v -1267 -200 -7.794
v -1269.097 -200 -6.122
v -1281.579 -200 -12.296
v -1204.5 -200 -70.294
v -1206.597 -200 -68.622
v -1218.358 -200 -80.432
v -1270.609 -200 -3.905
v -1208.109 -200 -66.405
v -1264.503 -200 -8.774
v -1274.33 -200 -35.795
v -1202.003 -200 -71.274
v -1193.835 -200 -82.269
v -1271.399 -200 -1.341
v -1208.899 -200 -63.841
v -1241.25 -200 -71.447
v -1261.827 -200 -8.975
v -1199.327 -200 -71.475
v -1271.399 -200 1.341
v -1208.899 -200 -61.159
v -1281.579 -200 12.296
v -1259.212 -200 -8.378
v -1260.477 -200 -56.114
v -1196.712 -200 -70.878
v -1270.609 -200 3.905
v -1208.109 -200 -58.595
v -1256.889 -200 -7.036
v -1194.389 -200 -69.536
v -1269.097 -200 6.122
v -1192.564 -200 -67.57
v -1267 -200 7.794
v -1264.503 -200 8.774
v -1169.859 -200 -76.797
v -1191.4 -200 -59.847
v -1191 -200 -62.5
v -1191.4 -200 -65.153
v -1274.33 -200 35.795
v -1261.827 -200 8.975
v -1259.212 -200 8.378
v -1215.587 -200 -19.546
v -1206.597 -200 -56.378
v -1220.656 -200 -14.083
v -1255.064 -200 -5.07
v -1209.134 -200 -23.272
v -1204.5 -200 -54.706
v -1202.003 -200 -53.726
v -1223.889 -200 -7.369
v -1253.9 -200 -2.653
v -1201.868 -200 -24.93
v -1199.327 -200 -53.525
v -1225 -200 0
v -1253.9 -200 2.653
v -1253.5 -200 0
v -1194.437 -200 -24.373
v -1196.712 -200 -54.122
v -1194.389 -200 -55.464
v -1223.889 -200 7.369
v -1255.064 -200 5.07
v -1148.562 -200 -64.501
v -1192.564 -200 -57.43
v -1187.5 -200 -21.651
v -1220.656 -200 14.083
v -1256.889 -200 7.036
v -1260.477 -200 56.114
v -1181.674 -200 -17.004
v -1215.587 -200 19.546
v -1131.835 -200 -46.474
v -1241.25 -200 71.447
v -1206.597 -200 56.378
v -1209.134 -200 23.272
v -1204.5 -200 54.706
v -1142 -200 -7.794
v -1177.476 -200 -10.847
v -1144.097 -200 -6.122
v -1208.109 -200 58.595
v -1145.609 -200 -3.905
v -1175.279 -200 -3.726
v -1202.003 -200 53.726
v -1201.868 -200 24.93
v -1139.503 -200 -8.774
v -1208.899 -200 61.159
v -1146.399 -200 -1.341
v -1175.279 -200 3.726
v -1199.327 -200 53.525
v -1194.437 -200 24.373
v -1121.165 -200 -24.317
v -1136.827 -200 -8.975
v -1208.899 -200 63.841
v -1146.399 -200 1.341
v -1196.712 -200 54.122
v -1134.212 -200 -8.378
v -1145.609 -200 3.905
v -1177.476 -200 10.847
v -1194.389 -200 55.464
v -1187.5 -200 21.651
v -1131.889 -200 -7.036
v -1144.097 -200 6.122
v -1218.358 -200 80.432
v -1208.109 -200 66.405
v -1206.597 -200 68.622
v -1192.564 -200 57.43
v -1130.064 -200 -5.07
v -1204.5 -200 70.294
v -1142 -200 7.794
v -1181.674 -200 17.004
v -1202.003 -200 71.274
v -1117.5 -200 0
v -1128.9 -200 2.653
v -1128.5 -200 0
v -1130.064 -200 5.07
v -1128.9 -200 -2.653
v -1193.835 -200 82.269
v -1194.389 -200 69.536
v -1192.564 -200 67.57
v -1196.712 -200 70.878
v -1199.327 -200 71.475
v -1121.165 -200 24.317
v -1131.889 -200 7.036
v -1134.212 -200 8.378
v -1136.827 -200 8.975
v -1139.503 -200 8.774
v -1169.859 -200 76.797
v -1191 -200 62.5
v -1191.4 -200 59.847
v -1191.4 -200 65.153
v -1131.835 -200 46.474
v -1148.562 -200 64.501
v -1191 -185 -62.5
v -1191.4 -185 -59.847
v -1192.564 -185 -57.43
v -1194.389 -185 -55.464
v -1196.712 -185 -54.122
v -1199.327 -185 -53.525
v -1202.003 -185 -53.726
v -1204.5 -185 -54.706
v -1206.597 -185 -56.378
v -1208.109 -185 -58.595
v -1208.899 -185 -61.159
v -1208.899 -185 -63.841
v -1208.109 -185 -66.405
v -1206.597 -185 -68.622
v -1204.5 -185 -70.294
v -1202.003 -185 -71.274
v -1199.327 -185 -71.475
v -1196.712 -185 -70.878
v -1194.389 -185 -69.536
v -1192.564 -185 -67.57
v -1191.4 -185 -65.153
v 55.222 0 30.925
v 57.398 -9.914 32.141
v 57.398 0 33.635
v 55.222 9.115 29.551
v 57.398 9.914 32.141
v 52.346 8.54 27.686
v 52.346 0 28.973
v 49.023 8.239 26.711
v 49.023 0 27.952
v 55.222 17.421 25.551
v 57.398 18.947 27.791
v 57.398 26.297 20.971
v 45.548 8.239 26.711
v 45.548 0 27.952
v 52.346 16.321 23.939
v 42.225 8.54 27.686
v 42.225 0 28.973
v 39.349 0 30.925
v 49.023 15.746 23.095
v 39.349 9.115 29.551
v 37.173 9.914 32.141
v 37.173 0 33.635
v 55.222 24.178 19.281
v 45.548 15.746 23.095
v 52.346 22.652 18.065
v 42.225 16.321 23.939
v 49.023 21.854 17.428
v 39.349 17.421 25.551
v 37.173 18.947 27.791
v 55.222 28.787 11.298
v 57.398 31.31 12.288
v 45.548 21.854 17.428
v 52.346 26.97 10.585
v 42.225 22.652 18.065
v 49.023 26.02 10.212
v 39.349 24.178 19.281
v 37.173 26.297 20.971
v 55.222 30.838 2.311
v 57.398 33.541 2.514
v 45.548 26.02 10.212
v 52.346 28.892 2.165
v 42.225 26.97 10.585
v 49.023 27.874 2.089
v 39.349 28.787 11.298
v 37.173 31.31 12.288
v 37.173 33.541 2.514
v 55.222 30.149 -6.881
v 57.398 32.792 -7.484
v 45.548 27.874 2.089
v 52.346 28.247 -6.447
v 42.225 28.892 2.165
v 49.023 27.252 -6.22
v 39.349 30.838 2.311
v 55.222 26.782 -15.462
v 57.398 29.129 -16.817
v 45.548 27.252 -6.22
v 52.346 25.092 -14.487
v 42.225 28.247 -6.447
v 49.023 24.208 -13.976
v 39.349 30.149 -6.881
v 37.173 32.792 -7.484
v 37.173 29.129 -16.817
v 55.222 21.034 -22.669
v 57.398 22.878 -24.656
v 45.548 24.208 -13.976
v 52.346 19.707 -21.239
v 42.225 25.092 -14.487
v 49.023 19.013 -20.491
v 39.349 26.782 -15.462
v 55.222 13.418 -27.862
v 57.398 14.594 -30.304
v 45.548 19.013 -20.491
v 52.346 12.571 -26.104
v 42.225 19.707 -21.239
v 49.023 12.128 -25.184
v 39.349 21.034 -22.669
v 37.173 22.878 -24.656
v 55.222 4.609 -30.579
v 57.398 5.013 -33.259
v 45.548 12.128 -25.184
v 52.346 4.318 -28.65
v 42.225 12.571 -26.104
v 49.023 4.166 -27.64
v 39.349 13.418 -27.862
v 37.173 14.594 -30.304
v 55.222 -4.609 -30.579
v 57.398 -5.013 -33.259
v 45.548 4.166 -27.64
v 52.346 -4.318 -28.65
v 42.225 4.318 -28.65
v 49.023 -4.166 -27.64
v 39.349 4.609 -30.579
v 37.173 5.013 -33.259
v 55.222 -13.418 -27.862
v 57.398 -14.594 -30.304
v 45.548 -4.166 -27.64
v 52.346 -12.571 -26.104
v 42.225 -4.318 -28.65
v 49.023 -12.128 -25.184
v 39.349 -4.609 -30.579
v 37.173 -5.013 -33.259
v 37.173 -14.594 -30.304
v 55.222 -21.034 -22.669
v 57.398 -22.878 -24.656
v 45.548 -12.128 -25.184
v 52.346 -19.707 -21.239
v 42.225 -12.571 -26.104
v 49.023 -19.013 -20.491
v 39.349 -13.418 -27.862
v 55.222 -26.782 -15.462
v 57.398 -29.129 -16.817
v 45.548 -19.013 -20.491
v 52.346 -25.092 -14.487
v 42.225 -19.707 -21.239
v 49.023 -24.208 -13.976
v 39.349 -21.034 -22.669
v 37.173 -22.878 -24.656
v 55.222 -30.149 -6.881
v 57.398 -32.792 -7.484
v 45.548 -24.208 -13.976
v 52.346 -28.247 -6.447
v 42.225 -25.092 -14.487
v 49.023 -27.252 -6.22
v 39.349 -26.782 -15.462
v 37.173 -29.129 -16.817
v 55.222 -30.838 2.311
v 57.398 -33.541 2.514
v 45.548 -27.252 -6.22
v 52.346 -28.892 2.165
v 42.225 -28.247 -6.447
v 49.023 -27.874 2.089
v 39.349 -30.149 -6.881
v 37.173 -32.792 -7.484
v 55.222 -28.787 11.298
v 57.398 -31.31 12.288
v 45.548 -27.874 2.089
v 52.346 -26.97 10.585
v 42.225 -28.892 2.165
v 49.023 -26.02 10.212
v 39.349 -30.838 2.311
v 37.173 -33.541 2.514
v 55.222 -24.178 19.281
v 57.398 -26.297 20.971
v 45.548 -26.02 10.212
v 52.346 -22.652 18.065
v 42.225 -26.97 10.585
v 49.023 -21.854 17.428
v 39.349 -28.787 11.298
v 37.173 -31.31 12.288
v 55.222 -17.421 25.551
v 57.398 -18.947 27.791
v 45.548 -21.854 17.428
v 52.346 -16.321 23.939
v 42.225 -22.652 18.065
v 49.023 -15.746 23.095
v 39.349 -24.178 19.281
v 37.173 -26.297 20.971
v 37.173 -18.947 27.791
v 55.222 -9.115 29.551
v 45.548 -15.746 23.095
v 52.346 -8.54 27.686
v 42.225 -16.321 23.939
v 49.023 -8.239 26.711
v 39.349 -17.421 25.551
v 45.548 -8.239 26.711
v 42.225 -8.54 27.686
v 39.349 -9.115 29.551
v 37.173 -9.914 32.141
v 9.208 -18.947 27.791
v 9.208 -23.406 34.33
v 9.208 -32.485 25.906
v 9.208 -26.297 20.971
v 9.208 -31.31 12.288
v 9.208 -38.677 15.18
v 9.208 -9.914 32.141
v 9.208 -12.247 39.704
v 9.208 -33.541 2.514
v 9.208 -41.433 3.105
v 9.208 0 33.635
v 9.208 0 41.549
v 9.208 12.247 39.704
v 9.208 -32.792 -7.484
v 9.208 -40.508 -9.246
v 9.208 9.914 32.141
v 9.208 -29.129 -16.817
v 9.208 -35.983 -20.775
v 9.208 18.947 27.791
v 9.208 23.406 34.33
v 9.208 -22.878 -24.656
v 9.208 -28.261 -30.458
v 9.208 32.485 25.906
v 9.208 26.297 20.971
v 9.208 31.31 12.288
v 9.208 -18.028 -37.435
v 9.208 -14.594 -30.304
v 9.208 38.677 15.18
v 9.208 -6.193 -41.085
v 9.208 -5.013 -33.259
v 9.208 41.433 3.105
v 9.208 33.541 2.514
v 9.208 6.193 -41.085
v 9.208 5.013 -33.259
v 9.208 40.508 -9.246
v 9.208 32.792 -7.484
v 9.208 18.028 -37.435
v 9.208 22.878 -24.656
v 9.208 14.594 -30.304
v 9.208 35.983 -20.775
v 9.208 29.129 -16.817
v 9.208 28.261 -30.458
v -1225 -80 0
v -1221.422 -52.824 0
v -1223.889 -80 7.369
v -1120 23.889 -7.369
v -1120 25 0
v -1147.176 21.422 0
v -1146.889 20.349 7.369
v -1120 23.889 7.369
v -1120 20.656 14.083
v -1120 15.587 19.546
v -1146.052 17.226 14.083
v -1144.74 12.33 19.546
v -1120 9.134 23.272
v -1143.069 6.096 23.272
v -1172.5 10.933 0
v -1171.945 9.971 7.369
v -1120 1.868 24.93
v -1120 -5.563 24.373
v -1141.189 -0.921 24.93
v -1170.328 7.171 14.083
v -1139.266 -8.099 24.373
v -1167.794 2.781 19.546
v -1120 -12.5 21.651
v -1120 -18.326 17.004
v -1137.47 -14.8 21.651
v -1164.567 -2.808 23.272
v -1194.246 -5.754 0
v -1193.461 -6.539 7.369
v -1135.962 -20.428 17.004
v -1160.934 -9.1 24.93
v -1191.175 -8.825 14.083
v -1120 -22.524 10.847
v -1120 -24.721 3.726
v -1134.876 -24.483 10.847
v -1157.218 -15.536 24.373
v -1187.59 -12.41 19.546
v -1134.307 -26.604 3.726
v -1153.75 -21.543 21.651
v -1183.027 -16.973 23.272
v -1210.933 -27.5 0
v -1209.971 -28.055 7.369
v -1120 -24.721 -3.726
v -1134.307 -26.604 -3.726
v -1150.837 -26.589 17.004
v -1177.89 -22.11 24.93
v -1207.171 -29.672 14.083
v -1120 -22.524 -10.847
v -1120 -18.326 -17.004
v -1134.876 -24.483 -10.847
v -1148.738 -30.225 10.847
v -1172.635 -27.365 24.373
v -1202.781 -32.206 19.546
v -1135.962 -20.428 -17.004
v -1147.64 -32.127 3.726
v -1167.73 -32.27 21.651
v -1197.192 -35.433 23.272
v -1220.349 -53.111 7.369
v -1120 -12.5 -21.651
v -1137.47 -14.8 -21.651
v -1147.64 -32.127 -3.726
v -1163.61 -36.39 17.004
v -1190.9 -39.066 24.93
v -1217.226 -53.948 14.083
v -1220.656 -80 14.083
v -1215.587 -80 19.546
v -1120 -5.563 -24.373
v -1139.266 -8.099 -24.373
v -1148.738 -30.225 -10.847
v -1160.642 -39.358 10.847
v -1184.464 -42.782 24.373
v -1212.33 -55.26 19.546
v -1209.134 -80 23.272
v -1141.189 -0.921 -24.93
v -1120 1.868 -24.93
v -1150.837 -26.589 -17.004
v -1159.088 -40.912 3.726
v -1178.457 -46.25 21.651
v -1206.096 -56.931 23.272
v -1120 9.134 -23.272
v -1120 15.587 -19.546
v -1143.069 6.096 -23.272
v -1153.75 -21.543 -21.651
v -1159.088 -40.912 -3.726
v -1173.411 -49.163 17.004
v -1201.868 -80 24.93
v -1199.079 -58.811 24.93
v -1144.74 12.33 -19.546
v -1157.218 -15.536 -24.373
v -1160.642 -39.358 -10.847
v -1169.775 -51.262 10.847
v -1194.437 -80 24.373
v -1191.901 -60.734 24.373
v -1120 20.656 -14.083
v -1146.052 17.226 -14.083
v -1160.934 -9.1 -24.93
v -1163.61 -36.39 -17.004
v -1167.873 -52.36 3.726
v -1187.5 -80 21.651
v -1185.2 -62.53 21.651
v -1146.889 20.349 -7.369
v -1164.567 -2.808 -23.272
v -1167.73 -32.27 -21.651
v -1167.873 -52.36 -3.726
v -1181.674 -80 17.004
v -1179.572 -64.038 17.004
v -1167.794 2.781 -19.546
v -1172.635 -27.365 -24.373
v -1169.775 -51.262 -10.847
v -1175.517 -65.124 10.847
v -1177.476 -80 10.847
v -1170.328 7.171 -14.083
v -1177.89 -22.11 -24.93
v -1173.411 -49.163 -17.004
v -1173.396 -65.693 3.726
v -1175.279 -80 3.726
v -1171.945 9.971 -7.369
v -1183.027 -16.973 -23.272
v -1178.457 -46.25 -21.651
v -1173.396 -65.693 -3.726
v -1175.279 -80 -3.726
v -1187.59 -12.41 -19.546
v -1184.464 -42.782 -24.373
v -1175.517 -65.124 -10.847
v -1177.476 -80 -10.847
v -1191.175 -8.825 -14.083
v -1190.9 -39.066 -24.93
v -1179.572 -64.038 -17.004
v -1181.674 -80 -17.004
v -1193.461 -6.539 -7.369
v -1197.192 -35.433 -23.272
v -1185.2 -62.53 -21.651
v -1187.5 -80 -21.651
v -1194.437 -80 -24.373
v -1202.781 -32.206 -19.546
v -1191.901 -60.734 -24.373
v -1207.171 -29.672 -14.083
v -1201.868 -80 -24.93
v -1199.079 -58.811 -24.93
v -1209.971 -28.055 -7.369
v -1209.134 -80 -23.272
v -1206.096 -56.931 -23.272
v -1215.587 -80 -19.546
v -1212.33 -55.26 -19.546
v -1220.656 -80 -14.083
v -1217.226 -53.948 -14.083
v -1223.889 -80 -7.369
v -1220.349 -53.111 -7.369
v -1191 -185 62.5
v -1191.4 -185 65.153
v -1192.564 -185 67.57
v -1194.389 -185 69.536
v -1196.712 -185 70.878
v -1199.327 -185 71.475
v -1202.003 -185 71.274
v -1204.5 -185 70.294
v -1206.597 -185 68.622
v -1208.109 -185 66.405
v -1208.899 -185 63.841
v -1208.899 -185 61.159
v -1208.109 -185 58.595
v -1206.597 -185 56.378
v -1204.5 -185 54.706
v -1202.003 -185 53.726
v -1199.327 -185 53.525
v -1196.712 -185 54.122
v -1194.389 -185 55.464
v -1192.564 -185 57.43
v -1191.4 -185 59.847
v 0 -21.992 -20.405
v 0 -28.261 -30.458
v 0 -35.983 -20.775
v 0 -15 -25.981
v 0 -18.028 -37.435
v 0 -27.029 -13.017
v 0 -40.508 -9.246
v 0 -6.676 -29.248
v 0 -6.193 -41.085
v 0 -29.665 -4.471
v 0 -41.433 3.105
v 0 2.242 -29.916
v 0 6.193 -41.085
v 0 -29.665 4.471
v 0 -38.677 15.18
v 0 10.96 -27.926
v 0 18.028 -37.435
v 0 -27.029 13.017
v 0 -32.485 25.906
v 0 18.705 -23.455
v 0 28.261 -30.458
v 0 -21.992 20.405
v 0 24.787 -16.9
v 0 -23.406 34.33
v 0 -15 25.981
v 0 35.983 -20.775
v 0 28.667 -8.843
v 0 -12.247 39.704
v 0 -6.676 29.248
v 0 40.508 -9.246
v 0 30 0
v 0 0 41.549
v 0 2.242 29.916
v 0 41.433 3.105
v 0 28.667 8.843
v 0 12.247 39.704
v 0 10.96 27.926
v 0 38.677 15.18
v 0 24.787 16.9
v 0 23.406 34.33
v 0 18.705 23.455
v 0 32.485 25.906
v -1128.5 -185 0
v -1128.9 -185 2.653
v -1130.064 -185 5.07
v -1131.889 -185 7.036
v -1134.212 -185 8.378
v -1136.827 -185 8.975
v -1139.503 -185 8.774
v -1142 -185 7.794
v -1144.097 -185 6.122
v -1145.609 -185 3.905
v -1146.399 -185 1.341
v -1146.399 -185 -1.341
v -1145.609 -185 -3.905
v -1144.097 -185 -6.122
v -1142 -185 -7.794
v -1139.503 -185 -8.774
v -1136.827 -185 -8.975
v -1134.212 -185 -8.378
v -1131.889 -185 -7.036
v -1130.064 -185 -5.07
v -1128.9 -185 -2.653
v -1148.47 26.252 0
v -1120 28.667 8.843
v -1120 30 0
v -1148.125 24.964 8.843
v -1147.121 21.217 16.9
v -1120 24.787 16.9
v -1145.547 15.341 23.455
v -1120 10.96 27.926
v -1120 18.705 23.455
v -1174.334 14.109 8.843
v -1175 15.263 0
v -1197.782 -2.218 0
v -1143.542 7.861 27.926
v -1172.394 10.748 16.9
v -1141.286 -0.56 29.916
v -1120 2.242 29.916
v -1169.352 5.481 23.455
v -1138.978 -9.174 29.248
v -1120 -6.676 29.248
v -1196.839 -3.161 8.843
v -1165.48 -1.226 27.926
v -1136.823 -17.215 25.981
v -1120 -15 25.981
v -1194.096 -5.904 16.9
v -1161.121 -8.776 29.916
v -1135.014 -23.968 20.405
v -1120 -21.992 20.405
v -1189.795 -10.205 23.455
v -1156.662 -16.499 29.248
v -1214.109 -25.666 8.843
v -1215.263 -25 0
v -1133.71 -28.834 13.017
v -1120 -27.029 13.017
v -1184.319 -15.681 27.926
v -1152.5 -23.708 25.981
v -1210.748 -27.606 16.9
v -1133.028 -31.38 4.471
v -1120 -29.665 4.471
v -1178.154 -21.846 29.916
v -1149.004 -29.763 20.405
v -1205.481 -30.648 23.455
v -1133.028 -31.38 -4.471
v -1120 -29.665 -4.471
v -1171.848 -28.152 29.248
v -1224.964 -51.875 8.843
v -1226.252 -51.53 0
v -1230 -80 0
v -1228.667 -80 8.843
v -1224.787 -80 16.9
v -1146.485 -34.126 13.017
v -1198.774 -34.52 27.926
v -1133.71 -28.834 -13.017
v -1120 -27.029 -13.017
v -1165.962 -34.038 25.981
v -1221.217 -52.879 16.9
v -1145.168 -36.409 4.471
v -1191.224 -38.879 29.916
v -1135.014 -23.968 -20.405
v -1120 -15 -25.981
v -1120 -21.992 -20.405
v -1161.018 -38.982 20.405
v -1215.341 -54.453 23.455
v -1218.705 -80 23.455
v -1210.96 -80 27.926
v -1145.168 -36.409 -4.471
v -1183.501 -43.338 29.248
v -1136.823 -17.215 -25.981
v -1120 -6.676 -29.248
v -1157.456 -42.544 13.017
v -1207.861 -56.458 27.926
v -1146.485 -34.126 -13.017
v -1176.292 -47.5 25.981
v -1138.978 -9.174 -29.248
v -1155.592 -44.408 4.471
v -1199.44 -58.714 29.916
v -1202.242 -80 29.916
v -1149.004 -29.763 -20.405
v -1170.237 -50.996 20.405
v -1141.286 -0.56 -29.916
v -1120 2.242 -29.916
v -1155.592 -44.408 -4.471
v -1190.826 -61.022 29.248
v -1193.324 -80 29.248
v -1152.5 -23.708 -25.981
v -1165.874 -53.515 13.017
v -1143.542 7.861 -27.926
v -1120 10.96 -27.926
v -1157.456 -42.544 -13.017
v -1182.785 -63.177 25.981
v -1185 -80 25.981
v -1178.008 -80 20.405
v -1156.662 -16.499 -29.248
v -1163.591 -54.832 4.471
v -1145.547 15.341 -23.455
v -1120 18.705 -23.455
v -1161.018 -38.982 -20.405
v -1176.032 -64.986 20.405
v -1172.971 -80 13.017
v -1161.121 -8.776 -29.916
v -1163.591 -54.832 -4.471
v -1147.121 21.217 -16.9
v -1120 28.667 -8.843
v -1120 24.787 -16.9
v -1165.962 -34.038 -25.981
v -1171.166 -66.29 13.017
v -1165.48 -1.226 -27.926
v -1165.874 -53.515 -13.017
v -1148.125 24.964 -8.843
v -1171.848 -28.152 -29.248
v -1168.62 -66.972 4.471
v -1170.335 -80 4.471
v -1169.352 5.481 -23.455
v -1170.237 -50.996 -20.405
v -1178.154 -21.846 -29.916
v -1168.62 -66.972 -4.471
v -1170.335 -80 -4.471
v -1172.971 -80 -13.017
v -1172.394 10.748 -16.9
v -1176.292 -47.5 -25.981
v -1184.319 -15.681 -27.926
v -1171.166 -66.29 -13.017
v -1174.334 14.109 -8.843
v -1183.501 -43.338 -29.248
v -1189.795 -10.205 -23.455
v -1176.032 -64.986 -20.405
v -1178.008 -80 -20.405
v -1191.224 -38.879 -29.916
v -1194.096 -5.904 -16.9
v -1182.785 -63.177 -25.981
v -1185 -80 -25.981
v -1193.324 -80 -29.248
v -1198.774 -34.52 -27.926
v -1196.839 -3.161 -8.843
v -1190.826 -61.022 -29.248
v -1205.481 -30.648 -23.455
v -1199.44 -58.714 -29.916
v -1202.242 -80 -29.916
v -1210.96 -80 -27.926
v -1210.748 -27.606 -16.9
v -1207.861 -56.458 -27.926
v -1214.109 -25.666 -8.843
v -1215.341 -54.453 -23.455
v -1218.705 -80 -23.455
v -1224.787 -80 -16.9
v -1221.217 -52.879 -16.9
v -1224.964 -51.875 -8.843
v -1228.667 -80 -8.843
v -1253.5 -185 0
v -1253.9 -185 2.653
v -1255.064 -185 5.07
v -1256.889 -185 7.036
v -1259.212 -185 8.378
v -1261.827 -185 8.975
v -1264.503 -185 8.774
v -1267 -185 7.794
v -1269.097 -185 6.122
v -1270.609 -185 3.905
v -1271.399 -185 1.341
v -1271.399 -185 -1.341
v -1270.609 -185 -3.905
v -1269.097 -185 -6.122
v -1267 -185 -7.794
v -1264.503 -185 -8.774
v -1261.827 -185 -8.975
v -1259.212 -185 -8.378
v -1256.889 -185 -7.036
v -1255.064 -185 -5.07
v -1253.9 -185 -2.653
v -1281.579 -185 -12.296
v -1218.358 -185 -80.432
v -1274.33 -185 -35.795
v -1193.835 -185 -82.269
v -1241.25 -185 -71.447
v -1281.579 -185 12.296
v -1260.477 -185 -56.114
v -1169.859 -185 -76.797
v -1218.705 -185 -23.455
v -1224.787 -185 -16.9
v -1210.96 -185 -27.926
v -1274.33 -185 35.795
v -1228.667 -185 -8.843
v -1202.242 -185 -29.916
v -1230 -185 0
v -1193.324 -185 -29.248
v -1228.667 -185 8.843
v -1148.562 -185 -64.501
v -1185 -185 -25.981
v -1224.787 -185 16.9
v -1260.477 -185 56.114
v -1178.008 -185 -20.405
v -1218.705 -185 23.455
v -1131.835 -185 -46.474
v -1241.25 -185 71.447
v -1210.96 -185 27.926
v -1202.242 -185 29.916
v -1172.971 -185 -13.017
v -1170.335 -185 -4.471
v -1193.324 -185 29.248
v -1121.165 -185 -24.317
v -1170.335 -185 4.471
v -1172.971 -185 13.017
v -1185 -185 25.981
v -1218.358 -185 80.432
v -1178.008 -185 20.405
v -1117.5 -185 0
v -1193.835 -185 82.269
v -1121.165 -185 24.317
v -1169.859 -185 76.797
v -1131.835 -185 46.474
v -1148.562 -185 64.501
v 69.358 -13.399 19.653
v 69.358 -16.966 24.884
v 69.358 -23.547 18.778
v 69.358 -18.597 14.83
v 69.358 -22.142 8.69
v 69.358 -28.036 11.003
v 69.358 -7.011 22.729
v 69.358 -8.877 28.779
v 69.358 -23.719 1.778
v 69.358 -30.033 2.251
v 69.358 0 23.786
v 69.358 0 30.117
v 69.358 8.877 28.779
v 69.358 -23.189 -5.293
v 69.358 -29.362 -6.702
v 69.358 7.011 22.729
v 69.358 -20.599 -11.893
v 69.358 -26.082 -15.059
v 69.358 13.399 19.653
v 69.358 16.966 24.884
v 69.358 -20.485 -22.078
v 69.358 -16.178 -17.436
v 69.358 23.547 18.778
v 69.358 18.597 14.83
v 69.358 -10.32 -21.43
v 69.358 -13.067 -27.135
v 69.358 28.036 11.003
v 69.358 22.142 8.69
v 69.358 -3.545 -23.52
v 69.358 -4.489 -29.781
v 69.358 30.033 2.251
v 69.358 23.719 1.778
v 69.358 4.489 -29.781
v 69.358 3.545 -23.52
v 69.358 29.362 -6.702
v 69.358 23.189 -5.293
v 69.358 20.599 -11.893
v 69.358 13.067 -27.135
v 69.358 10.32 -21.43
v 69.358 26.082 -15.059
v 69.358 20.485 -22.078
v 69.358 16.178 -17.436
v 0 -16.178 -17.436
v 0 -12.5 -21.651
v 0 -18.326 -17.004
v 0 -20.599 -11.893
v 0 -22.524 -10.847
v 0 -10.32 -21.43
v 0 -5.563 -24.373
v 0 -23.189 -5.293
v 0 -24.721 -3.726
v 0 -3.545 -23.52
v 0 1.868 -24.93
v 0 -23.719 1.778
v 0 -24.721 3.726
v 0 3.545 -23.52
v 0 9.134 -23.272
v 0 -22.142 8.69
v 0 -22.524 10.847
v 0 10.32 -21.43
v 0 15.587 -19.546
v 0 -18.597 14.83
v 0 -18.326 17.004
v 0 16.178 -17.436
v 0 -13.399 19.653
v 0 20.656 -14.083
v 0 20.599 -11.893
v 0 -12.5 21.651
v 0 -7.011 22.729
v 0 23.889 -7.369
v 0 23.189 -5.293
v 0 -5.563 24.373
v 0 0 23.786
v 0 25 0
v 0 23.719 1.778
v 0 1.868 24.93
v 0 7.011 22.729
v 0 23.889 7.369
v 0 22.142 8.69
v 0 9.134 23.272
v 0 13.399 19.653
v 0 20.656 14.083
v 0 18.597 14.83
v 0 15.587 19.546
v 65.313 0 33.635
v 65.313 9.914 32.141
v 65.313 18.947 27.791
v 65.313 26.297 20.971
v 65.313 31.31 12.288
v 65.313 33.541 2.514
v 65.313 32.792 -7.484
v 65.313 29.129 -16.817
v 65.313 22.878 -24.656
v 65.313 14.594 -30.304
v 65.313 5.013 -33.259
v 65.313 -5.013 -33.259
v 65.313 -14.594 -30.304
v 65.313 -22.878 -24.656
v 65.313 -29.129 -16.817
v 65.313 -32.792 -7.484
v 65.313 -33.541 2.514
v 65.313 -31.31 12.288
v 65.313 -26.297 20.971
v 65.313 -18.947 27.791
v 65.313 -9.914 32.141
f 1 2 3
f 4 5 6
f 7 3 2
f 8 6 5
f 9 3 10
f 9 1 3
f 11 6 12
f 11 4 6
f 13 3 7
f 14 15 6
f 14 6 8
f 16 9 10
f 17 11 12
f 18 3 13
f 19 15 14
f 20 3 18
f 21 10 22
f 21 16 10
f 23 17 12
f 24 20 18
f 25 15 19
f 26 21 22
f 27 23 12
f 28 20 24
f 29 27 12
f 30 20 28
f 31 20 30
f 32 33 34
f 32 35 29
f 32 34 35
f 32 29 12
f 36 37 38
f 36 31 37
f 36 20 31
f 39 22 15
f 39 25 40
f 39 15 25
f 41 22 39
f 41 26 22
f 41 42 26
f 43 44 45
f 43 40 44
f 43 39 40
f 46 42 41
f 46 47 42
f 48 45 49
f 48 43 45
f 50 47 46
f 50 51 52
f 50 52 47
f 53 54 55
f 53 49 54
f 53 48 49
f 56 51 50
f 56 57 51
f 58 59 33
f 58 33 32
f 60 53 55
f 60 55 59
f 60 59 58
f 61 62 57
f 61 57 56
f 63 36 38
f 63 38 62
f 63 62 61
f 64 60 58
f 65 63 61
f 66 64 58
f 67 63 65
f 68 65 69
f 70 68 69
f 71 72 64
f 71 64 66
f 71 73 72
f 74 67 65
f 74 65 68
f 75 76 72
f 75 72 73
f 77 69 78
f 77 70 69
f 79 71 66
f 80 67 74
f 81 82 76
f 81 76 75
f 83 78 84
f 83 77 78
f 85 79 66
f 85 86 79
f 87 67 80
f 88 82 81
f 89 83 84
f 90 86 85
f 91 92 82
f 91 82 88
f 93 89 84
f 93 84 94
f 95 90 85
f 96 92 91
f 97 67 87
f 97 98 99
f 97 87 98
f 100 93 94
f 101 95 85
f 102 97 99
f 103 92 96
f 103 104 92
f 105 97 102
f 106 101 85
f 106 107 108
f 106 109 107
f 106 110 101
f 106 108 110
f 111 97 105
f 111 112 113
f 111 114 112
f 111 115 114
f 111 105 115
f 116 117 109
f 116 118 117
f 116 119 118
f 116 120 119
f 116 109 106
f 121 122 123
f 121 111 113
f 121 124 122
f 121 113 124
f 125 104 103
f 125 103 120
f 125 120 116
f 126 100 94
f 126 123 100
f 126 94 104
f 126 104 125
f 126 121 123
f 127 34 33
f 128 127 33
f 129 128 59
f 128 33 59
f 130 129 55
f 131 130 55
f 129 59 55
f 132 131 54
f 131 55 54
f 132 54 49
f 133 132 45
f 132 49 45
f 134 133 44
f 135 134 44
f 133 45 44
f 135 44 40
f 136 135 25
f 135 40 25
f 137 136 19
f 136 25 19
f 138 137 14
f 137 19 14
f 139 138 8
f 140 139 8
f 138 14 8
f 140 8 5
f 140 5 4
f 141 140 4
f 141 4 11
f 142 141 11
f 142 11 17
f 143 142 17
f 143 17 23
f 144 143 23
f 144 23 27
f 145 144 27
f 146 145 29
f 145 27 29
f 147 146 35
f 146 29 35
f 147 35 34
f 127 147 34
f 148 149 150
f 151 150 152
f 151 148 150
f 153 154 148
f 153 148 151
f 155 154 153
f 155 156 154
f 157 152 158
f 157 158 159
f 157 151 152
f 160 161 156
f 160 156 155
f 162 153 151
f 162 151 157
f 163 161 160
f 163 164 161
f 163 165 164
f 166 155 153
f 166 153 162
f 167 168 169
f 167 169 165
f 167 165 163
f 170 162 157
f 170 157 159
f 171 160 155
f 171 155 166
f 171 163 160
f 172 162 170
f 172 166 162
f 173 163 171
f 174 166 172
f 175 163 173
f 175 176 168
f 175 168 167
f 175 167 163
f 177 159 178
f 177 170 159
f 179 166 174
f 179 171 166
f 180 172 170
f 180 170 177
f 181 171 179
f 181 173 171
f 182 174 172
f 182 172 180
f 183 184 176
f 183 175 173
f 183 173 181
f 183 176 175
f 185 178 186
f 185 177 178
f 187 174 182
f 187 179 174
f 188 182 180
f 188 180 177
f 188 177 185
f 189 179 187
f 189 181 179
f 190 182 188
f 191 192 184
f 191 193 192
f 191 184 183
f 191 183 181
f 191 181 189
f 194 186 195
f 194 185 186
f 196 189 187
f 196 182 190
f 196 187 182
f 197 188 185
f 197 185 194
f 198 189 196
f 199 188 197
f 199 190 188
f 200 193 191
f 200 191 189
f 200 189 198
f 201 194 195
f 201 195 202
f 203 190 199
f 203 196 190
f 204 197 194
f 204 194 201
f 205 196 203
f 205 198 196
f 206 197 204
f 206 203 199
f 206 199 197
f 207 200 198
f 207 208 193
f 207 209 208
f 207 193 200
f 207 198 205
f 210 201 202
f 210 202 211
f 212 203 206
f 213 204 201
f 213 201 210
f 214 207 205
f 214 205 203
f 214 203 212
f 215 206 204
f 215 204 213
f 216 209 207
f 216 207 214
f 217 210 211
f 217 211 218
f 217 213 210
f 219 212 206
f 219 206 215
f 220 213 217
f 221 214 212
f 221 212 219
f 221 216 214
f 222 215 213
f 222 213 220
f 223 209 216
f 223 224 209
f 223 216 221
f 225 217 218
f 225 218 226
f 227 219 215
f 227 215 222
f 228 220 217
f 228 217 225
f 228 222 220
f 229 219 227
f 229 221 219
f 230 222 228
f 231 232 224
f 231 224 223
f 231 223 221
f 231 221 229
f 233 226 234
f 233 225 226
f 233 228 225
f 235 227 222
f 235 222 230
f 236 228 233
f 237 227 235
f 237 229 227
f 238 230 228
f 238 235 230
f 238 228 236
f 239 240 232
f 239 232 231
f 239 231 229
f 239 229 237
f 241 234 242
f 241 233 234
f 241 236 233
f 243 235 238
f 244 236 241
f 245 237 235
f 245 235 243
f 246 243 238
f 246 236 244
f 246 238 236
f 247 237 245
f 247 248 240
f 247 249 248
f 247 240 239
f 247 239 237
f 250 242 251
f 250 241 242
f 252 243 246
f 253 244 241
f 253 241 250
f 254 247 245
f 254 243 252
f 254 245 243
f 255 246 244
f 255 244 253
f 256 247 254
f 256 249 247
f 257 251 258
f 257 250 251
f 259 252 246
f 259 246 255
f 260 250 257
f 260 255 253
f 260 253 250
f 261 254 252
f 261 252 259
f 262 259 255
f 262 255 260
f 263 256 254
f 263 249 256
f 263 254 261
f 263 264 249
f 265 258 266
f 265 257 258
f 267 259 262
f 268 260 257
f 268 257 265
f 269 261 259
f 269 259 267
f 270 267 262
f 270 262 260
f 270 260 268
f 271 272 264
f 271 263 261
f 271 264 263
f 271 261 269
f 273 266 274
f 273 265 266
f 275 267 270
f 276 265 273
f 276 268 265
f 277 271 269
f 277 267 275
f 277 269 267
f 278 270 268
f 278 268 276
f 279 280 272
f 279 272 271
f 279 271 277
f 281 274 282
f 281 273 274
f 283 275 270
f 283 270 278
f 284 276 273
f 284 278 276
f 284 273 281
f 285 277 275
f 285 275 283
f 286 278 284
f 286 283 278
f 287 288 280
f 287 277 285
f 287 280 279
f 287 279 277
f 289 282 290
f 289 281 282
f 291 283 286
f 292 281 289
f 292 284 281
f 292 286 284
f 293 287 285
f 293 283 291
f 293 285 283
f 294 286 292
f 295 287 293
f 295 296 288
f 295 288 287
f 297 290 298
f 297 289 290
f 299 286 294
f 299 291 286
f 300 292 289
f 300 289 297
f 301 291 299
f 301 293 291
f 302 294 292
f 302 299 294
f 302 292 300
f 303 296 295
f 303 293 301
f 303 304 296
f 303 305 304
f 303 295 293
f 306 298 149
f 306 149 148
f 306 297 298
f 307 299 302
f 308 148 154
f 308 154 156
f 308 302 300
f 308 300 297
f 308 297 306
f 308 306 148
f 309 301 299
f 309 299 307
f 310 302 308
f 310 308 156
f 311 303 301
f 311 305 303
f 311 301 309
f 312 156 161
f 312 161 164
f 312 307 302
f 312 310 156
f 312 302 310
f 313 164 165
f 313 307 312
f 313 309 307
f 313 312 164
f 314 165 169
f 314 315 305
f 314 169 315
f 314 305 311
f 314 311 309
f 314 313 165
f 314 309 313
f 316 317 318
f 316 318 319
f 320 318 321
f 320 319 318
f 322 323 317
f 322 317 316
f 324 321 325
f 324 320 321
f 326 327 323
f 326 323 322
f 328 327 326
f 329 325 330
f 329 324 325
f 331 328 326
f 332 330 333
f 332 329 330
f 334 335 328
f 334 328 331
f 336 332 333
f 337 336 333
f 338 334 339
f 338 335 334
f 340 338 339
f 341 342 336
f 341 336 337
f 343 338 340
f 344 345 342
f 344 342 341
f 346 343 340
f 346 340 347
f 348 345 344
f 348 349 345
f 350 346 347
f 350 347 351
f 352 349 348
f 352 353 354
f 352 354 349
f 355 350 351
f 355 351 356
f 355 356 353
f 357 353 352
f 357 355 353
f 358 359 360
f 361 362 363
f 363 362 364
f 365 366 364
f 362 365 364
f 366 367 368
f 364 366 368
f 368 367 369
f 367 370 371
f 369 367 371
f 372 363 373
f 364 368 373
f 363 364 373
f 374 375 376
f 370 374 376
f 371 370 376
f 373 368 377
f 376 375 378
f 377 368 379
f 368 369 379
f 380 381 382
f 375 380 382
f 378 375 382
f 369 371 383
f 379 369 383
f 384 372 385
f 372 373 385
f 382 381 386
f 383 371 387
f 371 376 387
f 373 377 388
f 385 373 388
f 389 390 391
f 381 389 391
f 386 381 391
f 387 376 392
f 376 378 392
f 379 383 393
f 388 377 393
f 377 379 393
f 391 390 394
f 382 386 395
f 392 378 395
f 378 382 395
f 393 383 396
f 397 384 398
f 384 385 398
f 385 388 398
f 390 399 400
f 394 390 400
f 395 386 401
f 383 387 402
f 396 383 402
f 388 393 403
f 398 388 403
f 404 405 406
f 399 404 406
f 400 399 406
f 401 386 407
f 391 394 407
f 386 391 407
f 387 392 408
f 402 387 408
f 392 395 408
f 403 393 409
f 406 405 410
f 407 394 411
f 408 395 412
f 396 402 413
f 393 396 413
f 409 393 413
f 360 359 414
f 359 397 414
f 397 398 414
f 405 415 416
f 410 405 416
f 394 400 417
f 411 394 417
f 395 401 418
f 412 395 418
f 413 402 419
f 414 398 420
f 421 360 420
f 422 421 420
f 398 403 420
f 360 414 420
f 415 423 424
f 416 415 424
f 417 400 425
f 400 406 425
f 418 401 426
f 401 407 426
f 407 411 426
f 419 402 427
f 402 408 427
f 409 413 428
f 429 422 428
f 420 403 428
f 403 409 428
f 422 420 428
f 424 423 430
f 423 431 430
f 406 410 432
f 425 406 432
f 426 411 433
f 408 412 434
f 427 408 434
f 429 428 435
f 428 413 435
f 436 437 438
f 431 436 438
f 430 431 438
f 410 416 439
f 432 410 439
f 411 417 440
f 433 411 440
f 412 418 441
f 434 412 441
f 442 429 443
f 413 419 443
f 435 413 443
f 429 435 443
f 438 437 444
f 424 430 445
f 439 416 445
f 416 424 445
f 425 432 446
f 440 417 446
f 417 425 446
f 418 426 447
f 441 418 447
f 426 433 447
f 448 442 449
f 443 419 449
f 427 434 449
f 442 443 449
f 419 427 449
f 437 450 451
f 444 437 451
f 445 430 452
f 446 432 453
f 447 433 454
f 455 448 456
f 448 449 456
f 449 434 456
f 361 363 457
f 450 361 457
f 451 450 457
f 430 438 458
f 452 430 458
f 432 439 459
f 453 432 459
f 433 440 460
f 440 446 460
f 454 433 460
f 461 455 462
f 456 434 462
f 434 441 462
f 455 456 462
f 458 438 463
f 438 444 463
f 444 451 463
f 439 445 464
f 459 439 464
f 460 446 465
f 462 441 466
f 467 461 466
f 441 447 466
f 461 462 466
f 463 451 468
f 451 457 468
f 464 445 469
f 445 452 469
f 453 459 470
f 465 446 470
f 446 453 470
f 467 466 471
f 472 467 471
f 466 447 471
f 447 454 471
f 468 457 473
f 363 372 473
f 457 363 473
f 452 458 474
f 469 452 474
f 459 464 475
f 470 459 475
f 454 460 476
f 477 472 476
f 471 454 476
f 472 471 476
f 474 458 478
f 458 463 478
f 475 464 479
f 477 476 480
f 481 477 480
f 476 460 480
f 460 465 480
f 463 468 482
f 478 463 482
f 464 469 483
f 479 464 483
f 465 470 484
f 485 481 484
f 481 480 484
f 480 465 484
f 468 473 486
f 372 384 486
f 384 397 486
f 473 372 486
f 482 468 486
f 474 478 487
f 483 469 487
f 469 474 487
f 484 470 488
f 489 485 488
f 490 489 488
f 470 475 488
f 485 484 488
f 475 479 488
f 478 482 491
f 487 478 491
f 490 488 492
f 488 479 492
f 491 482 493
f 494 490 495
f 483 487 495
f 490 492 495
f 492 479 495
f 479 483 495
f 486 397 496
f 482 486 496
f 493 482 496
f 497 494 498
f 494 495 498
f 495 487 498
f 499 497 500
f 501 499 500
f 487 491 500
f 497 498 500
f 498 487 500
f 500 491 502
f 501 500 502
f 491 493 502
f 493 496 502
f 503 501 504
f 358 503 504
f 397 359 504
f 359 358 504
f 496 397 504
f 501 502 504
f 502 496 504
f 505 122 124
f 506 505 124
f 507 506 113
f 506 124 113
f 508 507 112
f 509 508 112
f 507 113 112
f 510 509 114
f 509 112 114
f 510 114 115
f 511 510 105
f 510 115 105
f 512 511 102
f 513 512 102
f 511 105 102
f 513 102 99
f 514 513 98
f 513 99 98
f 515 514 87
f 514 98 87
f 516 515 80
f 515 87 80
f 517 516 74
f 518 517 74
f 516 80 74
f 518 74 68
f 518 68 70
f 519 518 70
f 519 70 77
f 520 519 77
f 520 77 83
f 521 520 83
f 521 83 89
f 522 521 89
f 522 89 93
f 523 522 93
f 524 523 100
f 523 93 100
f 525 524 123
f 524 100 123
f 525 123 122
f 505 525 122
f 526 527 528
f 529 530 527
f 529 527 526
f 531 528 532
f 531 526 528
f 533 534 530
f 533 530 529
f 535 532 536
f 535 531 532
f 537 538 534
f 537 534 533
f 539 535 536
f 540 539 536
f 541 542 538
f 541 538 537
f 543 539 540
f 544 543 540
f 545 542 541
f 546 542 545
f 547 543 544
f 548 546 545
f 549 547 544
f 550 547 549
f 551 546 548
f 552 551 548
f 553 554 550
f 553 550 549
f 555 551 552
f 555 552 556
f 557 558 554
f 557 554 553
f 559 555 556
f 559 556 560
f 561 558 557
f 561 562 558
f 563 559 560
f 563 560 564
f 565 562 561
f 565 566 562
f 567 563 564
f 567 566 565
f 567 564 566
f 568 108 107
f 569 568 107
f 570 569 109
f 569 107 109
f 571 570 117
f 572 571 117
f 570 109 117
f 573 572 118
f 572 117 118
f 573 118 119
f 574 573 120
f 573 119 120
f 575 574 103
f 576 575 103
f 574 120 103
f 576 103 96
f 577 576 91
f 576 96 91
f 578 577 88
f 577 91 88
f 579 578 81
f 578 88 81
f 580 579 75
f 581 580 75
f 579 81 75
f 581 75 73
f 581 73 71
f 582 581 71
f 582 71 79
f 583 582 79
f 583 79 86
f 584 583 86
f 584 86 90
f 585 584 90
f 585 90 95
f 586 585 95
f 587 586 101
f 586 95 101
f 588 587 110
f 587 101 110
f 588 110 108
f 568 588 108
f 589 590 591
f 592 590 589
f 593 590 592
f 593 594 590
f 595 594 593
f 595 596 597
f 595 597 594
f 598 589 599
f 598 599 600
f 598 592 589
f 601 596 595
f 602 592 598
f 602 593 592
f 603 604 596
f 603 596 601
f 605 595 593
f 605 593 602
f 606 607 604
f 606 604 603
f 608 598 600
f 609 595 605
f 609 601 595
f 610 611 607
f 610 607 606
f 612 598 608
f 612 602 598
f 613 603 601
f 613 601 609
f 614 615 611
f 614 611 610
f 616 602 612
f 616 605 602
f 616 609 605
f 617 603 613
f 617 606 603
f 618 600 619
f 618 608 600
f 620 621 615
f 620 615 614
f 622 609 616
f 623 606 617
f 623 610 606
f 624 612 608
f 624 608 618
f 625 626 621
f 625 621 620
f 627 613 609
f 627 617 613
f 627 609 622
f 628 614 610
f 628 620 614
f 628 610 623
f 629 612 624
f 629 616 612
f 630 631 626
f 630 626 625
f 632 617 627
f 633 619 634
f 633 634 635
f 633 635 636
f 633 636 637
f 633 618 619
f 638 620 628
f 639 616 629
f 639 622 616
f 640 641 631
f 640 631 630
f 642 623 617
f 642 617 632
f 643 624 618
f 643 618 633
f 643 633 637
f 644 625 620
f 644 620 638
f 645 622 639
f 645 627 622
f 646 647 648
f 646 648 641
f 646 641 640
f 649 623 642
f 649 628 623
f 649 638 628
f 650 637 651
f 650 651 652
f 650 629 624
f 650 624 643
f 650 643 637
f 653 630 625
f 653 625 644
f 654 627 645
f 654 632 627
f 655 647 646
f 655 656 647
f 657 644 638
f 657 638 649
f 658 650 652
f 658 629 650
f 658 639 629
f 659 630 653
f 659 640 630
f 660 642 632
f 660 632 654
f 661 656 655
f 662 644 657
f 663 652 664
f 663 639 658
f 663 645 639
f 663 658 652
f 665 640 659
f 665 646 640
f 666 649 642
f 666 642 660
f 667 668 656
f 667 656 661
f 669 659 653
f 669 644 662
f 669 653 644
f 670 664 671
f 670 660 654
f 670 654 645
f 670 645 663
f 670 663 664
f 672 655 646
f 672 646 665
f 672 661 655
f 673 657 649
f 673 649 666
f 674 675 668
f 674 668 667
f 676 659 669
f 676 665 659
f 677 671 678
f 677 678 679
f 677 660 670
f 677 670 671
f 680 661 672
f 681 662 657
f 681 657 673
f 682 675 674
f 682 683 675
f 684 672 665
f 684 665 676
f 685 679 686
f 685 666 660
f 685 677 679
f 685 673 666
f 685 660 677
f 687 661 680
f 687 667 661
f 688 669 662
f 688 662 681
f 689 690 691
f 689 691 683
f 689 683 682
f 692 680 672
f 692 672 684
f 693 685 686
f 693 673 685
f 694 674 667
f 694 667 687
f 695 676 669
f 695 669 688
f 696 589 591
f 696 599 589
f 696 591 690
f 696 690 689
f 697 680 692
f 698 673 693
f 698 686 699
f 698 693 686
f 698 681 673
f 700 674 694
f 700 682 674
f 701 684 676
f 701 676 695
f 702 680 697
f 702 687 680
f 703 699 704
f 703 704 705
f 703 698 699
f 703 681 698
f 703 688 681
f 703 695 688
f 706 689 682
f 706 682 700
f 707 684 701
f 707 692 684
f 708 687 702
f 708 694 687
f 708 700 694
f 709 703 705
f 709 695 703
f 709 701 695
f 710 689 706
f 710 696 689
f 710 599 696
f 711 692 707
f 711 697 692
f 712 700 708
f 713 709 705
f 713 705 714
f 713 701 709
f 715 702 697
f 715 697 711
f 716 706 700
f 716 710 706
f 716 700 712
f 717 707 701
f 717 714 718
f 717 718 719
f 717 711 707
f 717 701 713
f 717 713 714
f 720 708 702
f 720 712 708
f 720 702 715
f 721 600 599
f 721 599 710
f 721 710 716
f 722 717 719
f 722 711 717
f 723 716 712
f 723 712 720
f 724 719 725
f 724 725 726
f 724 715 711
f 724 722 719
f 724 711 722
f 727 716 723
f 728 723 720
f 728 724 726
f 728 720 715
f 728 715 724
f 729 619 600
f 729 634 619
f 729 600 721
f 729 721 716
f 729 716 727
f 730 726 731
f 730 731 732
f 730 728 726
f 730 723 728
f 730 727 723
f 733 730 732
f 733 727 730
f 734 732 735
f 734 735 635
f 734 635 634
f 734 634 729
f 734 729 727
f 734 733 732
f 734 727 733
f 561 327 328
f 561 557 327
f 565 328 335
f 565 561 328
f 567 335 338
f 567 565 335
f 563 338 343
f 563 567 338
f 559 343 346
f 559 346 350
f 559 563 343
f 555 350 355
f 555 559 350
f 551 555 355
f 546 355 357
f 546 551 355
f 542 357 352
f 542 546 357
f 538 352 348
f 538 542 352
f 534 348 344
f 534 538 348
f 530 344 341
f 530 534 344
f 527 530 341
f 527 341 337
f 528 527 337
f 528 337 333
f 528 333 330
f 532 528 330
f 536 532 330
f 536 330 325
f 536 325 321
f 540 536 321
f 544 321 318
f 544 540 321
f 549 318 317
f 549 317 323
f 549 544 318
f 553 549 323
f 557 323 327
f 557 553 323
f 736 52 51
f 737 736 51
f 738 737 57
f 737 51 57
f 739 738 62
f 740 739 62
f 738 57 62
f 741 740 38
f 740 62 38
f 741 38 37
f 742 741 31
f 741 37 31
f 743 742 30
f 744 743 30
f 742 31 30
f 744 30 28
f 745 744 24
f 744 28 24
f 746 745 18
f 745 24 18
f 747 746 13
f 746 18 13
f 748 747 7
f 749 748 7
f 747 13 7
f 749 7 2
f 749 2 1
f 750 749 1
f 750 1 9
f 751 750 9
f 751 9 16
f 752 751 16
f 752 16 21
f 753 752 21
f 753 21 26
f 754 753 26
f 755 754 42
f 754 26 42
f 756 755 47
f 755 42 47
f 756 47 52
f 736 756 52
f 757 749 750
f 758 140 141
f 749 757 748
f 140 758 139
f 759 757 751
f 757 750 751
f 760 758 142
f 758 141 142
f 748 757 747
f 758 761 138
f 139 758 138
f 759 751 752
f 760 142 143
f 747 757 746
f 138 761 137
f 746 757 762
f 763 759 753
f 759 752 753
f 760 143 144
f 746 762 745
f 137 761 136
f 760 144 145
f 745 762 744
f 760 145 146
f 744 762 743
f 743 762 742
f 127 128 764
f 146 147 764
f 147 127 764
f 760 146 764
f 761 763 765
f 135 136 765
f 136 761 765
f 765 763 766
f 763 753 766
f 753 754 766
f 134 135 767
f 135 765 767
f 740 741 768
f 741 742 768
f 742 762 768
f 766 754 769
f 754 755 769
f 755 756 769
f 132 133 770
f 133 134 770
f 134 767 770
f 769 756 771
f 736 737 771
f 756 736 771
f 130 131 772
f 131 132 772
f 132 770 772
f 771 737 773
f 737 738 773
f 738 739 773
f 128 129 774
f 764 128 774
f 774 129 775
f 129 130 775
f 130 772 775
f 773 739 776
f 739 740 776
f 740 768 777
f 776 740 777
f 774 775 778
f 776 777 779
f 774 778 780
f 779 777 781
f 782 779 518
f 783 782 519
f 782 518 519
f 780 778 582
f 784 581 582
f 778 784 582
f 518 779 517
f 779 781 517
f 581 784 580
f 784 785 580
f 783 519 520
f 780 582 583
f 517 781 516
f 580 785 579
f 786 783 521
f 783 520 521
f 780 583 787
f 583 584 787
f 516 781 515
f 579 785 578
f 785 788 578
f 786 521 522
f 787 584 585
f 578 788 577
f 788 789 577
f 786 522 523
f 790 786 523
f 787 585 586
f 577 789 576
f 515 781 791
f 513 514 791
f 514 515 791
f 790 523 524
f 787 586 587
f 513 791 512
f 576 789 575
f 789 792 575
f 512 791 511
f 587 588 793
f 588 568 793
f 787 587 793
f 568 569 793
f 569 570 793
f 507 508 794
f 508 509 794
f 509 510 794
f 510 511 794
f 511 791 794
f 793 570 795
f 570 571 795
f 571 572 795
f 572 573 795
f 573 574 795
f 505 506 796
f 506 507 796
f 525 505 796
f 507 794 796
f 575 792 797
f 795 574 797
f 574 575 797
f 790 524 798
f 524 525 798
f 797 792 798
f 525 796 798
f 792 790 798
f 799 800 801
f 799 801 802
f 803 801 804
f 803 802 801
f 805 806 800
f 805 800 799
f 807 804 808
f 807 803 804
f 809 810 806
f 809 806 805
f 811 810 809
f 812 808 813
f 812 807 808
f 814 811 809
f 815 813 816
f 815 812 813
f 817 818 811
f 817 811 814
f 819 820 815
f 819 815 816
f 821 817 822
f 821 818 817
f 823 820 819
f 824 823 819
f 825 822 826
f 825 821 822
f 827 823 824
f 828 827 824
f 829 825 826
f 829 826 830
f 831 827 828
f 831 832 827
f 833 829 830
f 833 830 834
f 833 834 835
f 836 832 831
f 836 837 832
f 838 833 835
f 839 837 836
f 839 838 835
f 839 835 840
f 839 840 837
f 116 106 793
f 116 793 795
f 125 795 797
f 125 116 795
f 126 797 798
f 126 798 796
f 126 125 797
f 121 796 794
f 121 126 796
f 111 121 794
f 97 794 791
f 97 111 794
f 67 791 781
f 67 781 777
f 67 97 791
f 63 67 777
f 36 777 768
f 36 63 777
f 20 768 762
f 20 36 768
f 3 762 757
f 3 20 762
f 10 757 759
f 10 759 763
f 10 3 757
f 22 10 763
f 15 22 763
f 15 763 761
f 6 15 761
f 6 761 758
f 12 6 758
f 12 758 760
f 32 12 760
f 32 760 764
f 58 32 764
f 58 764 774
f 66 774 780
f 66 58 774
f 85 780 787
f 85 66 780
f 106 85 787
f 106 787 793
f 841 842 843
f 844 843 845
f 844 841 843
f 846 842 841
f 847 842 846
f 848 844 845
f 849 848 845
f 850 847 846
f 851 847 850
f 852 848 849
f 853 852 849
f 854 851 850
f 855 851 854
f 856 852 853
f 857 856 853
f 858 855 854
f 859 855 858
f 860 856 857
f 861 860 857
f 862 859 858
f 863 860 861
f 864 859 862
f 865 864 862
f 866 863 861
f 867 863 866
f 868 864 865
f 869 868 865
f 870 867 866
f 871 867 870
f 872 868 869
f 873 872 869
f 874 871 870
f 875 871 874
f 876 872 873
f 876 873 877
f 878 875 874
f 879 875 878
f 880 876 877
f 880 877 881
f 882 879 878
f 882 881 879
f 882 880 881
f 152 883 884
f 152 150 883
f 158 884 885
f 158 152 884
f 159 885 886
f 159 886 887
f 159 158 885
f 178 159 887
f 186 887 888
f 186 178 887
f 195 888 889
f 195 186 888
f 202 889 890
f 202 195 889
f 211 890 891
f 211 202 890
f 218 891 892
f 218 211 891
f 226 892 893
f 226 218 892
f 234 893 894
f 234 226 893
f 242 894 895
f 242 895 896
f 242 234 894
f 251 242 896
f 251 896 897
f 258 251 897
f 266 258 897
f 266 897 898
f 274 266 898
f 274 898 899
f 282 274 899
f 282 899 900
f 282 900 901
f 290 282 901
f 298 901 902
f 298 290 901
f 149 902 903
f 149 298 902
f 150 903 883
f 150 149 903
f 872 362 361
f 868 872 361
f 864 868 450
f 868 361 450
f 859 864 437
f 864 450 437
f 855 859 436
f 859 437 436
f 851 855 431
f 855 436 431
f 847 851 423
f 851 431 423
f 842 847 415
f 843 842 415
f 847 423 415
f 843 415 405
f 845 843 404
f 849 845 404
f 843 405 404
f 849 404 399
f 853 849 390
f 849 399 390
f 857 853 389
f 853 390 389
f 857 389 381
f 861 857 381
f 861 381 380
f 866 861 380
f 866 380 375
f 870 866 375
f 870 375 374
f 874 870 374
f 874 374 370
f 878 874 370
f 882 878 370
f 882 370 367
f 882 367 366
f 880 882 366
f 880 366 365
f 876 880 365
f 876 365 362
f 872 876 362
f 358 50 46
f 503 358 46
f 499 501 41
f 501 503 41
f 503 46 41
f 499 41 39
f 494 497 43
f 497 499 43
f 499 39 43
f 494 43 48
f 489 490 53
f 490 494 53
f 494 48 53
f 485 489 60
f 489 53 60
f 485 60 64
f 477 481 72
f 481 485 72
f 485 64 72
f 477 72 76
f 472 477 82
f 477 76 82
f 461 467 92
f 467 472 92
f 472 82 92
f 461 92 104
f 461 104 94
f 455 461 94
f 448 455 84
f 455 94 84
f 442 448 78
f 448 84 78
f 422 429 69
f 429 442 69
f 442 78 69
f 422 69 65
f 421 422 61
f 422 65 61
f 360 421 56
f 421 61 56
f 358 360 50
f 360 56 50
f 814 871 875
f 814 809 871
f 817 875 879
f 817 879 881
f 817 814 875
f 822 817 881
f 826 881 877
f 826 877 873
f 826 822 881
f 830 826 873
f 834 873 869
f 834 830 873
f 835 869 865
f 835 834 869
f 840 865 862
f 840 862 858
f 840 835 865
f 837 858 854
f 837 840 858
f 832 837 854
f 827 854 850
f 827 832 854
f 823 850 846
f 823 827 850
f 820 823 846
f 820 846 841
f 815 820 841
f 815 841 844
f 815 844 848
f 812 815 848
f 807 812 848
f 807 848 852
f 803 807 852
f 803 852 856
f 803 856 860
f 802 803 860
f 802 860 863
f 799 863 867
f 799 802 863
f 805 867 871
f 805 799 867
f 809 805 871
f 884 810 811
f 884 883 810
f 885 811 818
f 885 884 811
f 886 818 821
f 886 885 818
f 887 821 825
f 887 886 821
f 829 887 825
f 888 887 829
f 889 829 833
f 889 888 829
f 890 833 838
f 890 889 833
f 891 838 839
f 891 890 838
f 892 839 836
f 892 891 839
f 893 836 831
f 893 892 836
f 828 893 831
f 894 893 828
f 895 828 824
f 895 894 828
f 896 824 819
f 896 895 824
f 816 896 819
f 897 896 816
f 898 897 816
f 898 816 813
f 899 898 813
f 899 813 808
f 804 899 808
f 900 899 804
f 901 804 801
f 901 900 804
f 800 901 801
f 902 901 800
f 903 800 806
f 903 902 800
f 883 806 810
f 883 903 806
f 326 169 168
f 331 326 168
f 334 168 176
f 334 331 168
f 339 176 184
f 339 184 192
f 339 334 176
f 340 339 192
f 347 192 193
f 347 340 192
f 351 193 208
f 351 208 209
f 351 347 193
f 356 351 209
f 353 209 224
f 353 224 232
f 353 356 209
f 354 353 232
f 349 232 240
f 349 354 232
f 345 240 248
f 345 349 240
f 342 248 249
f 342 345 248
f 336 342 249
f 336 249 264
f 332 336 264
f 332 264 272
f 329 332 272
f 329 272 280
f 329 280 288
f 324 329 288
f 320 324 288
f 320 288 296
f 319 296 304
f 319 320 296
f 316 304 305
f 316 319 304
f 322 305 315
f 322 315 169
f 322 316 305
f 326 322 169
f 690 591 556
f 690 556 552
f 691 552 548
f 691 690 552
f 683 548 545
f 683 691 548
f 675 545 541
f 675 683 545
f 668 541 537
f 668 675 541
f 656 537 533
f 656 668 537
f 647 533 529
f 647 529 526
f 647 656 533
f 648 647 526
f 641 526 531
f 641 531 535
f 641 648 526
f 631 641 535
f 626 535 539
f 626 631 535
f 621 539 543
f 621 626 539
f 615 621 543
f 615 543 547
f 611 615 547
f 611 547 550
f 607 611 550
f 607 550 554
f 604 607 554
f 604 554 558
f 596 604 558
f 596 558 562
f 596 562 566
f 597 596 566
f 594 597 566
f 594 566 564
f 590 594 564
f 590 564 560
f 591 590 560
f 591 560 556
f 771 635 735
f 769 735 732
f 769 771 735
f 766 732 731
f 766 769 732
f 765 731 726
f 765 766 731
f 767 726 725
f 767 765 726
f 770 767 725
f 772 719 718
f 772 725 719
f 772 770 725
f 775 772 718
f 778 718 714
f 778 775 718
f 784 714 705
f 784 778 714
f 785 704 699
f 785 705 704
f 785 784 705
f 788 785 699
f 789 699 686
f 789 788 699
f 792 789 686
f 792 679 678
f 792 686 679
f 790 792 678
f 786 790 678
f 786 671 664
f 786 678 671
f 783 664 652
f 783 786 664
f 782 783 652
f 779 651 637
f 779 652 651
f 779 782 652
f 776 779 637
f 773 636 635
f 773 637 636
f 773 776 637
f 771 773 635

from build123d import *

# Parameters (mm, degrees)
F1_R     = 30
F1_R_2   = 25
F3_R     = 82.5
F3_R_2   = 9
F3_R_3   = 25
F4_DEPTH = 15


with BuildPart() as f2:
    # F2: sweep along a path in F0
    with BuildLine(Plane.XY) as f2_path:
        Line((0, 0), (-1120, 0))
        ThreePointArc((-1120, 0), (-1176.5685424949, -23.4314575051), (-1200, -80))
        Line((-1200, -80), (-1200, -200))
    # F1 (on Right) → F2 (sweep)
    with BuildSketch(Plane.YZ):
        Circle(F1_R)
        Circle(F1_R_2, mode=Mode.SUBTRACT)
    sweep(path=f2_path.line)

    # F3 (on face) → F4 (join)
    with BuildSketch(Plane.XZ.offset(200)):
        with Locations((-1200, 0)):
            Circle(F3_R)
        with Locations((-1200, -62.5)):
            Circle(F3_R_2, mode=Mode.SUBTRACT)
        with Locations((-1262.5, 0)):
            Circle(F3_R_2, mode=Mode.SUBTRACT)
        with Locations((-1200, 0)):
            Circle(F3_R_3, mode=Mode.SUBTRACT)
        with Locations((-1137.5, 0)):
            Circle(F3_R_2, mode=Mode.SUBTRACT)
        with Locations((-1200, 62.5)):
            Circle(F3_R_2, mode=Mode.SUBTRACT)
    extrude(amount=-F4_DEPTH)

    # F5 (on Front) → F6 (revolve)
    with BuildSketch(Plane.XZ):
        with BuildLine():
            Line((0, 30), (0, 23.7858332694))
            Line((0, 23.7858332694), (69.3580582738, 23.7858332694))
            Line((69.3580582738, 23.7858332694), (69.3580582738, 30.1174111664))
            Line((69.3580582738, 30.1174111664), (65.3128772974, 33.6349532008))
            Line((65.3128772974, 33.6349532008), (57.3984086514, 33.6349532008))
            ThreePointArc((57.3984086514, 33.6349532008), (47.2854711115, 27.8227466971), (37.1725335717, 33.6349532008))
            Line((37.1725335717, 33.6349532008), (9.208066389, 33.6349532008))
            Line((9.208066389, 33.6349532008), (9.208066389, 41.5494255722))
            Line((9.208066389, 41.5494255722), (0, 41.5494255722))
            Line((0, 41.5494255722), (0, 30))
        make_face()
    revolve(axis=Axis((0, 0, 0), (-1, 0, 0)))


solid = f2.part
